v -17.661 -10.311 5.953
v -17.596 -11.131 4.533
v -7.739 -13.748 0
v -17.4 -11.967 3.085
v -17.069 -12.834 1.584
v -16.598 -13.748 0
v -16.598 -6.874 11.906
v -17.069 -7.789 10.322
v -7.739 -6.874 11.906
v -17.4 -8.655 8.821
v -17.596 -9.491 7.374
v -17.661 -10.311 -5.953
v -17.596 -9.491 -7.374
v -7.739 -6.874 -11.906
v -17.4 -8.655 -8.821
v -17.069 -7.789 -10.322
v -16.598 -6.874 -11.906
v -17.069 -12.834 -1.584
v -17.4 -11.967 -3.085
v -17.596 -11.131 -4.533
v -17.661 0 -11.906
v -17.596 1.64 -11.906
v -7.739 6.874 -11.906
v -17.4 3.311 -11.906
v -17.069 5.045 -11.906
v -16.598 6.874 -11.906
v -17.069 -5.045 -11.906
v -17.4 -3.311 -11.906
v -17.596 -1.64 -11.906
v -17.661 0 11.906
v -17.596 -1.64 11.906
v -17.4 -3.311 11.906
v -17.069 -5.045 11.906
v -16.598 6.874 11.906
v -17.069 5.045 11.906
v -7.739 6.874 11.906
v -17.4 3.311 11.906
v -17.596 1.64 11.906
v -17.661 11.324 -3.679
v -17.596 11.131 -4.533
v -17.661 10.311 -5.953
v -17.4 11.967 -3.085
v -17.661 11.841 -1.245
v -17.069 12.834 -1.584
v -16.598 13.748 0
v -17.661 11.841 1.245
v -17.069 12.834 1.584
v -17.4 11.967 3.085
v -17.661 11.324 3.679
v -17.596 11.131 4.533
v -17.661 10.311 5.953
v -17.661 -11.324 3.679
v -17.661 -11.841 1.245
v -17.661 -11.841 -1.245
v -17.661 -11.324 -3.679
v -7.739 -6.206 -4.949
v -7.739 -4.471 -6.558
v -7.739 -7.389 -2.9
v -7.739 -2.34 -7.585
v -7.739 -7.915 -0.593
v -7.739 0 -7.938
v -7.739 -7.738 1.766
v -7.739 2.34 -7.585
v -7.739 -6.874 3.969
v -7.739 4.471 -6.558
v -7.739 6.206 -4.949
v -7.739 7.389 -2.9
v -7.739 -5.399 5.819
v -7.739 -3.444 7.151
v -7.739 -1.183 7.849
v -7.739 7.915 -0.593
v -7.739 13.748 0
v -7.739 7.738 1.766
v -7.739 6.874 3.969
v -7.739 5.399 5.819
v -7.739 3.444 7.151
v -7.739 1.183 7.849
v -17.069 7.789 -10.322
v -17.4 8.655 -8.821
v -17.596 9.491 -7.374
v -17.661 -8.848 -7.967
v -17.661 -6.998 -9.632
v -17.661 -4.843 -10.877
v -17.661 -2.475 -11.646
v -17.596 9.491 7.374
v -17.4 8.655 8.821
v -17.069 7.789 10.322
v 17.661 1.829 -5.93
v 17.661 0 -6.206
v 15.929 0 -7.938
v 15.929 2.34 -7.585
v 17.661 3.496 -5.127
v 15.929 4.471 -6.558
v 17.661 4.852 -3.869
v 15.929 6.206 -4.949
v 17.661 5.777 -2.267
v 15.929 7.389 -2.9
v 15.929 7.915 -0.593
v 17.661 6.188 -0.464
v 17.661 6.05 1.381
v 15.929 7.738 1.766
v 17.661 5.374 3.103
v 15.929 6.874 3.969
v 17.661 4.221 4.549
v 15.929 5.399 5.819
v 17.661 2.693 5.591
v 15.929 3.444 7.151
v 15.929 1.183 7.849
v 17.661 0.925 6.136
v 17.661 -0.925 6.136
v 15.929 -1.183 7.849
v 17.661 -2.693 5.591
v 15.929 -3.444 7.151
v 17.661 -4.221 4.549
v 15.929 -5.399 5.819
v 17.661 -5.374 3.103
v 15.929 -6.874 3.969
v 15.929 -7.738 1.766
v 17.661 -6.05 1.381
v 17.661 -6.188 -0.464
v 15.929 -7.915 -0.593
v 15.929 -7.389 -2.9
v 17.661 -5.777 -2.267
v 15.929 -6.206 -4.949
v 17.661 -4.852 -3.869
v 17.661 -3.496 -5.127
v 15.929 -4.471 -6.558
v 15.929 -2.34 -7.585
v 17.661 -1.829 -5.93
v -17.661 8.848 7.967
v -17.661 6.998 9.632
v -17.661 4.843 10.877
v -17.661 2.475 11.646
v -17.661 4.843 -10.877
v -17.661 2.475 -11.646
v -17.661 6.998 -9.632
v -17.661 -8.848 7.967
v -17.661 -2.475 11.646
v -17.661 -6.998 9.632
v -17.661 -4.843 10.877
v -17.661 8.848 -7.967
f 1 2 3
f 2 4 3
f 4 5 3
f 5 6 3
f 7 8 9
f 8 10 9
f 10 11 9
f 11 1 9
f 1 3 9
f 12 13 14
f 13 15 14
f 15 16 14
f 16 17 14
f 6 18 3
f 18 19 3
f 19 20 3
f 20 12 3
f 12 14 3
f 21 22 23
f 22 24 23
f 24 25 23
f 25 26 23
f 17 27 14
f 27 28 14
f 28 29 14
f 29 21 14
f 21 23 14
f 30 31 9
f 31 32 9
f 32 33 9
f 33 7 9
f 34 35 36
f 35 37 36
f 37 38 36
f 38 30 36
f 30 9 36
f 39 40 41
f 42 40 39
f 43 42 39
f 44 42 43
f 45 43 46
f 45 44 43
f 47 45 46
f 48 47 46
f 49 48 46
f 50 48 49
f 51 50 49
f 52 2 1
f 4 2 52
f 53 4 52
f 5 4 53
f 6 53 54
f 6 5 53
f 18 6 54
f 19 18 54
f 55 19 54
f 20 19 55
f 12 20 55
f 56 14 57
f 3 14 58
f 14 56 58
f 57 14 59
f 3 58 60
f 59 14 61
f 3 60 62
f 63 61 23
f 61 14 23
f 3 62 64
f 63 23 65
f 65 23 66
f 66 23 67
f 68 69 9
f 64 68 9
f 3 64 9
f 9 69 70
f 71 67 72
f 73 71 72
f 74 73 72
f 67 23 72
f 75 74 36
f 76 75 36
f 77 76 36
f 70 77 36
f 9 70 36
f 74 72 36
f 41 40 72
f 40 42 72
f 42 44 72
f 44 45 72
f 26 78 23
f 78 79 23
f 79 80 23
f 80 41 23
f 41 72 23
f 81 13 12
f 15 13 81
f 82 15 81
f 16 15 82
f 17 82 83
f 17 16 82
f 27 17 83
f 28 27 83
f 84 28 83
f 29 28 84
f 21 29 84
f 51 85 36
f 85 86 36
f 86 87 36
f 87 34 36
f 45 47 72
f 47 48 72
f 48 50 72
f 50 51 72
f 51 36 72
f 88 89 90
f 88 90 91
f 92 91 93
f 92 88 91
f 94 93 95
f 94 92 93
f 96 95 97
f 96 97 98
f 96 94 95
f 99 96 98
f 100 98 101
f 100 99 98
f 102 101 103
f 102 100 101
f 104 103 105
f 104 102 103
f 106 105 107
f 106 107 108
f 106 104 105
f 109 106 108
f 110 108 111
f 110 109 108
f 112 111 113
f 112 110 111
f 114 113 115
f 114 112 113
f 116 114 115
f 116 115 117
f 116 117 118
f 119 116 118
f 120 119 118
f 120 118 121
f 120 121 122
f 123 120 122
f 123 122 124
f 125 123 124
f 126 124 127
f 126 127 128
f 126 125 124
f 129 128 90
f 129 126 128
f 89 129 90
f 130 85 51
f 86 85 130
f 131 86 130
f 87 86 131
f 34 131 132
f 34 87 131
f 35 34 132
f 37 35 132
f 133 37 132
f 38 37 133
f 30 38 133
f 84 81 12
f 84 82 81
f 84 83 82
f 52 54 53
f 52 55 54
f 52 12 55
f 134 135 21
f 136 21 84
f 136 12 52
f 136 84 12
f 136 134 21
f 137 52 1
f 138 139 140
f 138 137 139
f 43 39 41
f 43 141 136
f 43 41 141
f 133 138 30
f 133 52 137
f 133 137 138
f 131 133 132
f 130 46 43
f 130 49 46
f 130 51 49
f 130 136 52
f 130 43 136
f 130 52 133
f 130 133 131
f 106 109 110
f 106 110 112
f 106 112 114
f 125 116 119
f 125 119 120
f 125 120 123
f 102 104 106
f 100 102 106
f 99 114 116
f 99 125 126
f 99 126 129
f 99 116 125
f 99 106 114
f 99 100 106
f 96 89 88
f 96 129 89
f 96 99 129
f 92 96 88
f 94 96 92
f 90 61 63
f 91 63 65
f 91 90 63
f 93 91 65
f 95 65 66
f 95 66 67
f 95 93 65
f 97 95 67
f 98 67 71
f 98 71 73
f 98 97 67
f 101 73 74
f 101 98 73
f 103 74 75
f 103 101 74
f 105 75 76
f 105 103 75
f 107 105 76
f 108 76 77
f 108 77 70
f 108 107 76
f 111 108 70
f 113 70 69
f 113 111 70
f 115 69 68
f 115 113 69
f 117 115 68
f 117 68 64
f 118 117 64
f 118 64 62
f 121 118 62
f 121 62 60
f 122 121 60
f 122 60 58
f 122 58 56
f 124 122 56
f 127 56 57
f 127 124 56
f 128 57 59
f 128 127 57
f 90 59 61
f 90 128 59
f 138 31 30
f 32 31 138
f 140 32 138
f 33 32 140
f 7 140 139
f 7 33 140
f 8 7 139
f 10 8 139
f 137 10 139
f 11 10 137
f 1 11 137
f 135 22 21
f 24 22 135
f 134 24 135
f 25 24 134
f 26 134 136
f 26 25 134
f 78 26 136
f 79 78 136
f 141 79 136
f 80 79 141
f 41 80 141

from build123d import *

# Parameters (mm, degrees)
SKETCH5_R           = 7.9375
BOSS_EXTRUDE3_DEPTH = 25.4
CHAMFER1_SIZE       = 1.731818182
BOSS_EXTRUDE4_DEPTH = 9.921875
SKETCH8_OUTSIDE_W   = 161.776
SKETCH8_OUTSIDE_H   = 165.46
SKETCH8_OUTSIDE_R   = 11.90625
CUT_EXTRUDE3_DEPTH  = 36.321875
CUT_EXTRUDE3_TAPER  = 60


with BuildPart() as part:
    # Sketch5 → Boss-Extrude3 (new body)
    with BuildSketch(Plane(origin=(17.6609375, 0, 0), x_dir=(0, 0, -1), z_dir=(1, 0, 0))):
        Circle(SKETCH5_R)
    extrude(amount=-BOSS_EXTRUDE3_DEPTH)

    # Chamfer1
    chamfer1_edges = [part.edges().sort_by_distance(p)[0] for p in [
        (17.6609375, 0, 7.9375),
    ]]
    chamfer(chamfer1_edges, length=CHAMFER1_SIZE)

    # Sketch6 → Boss-Extrude4 (add)
    with BuildSketch(Plane.ZY.offset(7.7390625)):
        Polygon((11.90625, 6.874076643), (0, 13.748153285), (-11.90625, 6.874076643), (-11.90625, -6.874076643), (0, -13.748153285), (11.90625, -6.874076643), align=None)
    extrude(amount=BOSS_EXTRUDE4_DEPTH)

    # Sketch8 outside → Cut-Extrude3 (cut, through all)
    with BuildSketch(Plane.ZY.offset(17.6609375)):
        Rectangle(SKETCH8_OUTSIDE_W, SKETCH8_OUTSIDE_H)
        Circle(SKETCH8_OUTSIDE_R, mode=Mode.SUBTRACT)
    extrude(amount=-CUT_EXTRUDE3_DEPTH, taper=CUT_EXTRUDE3_TAPER, mode=Mode.SUBTRACT)


solid = part.part
